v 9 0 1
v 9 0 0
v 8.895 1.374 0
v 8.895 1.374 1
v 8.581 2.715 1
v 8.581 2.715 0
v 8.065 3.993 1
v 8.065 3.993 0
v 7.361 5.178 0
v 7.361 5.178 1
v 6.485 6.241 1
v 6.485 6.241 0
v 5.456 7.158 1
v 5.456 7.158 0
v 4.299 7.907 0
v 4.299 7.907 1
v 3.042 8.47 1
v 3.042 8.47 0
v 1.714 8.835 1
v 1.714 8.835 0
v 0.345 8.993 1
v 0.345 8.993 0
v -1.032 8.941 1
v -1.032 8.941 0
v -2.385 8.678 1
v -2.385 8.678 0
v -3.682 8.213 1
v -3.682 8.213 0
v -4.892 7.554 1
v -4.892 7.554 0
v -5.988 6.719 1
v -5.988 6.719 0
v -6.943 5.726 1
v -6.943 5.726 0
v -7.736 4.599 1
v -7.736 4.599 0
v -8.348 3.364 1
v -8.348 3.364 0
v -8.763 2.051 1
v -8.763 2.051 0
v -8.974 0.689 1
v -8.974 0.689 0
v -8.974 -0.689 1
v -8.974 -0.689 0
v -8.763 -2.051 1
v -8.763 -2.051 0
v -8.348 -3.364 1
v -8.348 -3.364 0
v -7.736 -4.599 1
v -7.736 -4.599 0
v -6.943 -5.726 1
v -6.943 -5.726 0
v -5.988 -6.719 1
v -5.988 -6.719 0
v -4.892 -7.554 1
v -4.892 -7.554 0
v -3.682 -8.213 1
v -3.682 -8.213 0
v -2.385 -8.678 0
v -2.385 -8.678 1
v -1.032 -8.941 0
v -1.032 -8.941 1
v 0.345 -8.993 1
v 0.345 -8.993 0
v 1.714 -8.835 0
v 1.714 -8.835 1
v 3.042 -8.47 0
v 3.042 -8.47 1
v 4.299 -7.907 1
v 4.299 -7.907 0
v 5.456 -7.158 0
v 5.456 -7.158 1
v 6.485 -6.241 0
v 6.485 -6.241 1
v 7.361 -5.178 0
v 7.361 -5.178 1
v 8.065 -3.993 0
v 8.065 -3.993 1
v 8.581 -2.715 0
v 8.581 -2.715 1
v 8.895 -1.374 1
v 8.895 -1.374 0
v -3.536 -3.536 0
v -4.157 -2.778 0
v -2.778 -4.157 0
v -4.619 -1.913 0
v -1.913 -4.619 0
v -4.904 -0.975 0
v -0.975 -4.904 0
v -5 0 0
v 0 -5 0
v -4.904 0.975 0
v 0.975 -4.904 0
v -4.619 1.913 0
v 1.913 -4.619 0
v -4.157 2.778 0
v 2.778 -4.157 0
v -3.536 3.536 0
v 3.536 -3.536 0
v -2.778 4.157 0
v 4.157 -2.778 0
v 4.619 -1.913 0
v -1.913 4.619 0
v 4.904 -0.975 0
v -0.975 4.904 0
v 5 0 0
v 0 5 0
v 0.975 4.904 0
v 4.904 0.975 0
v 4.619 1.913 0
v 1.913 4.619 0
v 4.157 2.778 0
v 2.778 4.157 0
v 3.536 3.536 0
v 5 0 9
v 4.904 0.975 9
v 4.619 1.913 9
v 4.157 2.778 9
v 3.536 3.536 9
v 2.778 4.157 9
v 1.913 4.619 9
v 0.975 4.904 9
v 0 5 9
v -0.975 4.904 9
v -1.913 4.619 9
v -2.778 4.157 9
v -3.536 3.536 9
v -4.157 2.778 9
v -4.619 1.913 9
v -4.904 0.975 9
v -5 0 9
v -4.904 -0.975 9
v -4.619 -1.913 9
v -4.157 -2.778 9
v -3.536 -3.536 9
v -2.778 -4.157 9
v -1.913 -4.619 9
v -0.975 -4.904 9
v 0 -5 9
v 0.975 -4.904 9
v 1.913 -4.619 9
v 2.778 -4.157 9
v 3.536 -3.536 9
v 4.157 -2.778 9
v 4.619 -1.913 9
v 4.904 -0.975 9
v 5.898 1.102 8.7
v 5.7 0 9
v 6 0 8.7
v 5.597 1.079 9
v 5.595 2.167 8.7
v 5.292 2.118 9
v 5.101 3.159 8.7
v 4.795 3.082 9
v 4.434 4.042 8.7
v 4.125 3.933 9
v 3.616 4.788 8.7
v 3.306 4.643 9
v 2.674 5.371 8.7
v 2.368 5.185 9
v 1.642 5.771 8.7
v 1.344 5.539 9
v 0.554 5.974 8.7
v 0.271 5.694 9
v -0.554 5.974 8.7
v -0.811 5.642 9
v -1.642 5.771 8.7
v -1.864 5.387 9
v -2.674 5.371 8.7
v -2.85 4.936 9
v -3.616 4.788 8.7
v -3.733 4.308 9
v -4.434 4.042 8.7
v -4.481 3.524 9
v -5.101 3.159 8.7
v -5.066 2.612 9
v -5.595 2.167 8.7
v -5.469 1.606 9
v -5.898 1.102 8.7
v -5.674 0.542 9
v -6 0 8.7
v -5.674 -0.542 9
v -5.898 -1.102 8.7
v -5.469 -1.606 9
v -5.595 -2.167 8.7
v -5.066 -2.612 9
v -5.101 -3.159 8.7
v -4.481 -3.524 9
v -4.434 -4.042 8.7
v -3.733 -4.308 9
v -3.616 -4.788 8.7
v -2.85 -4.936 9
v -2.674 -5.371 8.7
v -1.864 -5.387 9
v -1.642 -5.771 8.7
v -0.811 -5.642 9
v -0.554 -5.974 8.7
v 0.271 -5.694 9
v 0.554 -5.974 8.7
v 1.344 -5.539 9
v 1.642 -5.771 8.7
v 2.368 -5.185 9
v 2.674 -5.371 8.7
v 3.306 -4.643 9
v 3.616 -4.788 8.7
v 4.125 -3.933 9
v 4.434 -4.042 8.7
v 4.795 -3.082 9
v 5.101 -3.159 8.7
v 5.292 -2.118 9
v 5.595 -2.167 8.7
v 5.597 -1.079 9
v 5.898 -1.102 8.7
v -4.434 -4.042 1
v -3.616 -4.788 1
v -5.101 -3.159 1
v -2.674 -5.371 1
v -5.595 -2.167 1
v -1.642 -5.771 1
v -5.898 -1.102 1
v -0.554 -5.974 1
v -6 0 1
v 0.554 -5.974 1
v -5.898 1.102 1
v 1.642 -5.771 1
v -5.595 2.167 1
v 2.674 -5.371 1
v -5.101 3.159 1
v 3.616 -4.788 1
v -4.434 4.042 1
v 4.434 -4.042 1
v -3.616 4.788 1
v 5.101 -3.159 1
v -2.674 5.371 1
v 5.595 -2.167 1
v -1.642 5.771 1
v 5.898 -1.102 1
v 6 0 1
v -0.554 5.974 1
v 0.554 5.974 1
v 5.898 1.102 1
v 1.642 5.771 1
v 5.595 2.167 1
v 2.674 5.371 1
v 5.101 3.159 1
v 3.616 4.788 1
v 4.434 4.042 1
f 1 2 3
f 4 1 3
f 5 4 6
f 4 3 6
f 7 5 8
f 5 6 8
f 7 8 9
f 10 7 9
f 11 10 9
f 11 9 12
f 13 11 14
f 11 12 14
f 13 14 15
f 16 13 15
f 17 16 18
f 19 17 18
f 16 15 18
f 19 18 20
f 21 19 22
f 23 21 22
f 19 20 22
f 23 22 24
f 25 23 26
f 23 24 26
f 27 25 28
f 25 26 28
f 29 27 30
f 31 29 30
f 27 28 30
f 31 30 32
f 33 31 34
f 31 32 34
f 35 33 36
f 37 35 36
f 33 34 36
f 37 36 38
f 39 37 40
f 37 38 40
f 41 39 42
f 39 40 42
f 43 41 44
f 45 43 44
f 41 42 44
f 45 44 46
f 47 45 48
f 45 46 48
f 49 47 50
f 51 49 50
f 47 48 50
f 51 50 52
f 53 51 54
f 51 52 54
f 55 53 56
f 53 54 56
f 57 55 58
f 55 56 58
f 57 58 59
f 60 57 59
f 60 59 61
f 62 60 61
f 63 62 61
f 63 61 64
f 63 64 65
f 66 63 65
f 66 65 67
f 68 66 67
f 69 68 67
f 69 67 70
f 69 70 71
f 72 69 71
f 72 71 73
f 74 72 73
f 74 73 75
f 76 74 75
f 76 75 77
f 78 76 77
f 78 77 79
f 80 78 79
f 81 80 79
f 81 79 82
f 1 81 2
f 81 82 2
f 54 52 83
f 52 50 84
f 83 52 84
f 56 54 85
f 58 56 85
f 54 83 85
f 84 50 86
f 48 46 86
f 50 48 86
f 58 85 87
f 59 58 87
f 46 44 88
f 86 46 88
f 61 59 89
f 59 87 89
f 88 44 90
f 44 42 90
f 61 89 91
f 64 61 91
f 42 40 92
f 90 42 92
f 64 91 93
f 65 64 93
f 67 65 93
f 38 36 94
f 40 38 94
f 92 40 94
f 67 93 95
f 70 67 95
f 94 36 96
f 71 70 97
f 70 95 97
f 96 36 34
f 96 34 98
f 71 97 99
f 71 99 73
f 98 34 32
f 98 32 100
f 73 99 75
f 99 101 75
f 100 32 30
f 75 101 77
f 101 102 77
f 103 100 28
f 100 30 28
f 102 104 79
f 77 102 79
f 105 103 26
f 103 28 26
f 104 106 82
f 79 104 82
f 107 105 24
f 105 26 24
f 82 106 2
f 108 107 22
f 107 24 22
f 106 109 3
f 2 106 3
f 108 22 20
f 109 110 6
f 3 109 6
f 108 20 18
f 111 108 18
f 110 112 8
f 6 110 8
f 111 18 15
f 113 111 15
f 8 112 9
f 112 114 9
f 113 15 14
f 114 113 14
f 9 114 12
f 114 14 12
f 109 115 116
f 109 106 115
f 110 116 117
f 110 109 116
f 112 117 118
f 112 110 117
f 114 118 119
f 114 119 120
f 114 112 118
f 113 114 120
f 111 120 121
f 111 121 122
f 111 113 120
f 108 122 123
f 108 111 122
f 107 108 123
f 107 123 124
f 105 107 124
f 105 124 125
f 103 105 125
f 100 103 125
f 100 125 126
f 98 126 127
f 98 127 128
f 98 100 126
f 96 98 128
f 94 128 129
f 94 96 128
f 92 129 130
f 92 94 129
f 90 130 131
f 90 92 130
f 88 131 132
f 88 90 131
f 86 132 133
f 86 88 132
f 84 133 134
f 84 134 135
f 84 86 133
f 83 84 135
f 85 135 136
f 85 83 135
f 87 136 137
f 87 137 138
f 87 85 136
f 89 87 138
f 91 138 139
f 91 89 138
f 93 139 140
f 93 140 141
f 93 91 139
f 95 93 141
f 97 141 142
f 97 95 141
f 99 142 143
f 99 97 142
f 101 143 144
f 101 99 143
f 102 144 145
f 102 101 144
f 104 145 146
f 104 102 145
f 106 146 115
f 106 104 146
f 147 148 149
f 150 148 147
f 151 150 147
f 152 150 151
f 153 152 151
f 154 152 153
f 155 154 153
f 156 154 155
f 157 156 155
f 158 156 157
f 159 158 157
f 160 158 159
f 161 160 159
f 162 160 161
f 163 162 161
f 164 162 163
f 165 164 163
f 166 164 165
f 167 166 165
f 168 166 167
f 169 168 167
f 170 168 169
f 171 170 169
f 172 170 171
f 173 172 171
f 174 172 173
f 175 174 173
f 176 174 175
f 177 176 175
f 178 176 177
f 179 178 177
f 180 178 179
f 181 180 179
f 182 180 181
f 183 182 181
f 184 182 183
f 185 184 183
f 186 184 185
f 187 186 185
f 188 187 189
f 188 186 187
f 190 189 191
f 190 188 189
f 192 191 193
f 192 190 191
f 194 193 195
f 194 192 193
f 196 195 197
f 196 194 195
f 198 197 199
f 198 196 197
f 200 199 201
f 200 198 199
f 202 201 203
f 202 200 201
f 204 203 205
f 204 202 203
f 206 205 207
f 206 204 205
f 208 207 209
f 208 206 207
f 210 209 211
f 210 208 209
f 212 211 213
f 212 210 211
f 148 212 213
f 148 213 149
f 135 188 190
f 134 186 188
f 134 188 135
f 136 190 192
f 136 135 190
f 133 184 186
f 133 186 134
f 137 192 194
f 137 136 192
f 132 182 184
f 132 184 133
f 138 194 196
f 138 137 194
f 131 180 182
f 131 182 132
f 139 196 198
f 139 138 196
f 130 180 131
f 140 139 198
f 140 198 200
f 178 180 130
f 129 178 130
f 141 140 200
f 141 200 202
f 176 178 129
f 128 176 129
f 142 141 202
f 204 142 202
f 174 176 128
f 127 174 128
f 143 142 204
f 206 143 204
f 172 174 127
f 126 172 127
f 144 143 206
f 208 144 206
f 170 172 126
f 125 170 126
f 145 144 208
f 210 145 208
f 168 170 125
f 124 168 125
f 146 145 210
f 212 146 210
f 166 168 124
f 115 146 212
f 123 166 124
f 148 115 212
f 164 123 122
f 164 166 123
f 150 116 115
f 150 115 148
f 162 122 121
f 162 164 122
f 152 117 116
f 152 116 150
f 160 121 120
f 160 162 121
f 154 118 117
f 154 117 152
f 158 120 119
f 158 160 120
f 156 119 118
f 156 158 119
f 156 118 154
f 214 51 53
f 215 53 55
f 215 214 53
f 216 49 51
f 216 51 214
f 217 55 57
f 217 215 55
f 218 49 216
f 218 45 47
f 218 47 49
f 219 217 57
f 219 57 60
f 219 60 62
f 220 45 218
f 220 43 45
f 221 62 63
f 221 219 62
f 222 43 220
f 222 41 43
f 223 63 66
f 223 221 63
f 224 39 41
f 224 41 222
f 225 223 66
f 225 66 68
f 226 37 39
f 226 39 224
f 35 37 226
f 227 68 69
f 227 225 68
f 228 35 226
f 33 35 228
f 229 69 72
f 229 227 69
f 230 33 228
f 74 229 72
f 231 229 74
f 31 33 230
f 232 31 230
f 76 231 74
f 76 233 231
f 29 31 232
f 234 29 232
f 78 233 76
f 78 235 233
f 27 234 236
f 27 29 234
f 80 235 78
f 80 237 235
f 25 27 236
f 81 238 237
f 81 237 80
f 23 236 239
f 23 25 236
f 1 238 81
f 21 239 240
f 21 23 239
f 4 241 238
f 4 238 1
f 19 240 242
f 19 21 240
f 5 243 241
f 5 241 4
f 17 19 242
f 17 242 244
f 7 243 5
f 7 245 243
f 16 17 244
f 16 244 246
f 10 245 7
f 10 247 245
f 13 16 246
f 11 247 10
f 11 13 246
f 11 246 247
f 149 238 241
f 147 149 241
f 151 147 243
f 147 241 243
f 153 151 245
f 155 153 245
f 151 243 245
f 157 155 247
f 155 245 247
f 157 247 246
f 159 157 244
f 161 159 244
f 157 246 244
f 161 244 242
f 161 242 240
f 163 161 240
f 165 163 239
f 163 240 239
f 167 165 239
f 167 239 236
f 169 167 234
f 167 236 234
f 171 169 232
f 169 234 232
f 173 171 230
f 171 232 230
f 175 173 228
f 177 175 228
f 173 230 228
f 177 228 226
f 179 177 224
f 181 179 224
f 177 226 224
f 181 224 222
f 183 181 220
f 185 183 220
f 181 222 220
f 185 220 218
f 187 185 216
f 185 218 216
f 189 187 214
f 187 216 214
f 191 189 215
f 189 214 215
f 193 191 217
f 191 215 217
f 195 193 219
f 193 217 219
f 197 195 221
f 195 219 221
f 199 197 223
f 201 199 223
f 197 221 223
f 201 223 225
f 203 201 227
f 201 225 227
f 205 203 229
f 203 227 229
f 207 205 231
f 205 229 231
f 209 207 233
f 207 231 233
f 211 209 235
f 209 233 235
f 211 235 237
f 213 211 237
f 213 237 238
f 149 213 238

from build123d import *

# Parameters (mm, degrees)
SKETCH1_R           = 9
SKETCH1_R_2         = 5
BOSS_EXTRUDE1_DEPTH = 1
SKETCH2_R           = 6
SKETCH2_R_2         = 5
BOSS_EXTRUDE2_DEPTH = 8
CHAMFER1_SIZE       = 0.3


with BuildPart() as part:
    # Sketch1 → Boss-Extrude1 (new body)
    with BuildSketch(Plane.XY):
        Circle(SKETCH1_R)
        Circle(SKETCH1_R_2, mode=Mode.SUBTRACT)
    extrude(amount=BOSS_EXTRUDE1_DEPTH)

    # Sketch2 → Boss-Extrude2 (add)
    with BuildSketch(Plane.XY.offset(1)):
        Circle(SKETCH2_R)
        Circle(SKETCH2_R_2, mode=Mode.SUBTRACT)
    extrude(amount=BOSS_EXTRUDE2_DEPTH)

    # Chamfer1
    chamfer1_edges = [part.edges().sort_by_distance(p)[0] for p in [
        (-6, 0, 9),
    ]]
    chamfer(chamfer1_edges, length=CHAMFER1_SIZE)


solid = part.part
